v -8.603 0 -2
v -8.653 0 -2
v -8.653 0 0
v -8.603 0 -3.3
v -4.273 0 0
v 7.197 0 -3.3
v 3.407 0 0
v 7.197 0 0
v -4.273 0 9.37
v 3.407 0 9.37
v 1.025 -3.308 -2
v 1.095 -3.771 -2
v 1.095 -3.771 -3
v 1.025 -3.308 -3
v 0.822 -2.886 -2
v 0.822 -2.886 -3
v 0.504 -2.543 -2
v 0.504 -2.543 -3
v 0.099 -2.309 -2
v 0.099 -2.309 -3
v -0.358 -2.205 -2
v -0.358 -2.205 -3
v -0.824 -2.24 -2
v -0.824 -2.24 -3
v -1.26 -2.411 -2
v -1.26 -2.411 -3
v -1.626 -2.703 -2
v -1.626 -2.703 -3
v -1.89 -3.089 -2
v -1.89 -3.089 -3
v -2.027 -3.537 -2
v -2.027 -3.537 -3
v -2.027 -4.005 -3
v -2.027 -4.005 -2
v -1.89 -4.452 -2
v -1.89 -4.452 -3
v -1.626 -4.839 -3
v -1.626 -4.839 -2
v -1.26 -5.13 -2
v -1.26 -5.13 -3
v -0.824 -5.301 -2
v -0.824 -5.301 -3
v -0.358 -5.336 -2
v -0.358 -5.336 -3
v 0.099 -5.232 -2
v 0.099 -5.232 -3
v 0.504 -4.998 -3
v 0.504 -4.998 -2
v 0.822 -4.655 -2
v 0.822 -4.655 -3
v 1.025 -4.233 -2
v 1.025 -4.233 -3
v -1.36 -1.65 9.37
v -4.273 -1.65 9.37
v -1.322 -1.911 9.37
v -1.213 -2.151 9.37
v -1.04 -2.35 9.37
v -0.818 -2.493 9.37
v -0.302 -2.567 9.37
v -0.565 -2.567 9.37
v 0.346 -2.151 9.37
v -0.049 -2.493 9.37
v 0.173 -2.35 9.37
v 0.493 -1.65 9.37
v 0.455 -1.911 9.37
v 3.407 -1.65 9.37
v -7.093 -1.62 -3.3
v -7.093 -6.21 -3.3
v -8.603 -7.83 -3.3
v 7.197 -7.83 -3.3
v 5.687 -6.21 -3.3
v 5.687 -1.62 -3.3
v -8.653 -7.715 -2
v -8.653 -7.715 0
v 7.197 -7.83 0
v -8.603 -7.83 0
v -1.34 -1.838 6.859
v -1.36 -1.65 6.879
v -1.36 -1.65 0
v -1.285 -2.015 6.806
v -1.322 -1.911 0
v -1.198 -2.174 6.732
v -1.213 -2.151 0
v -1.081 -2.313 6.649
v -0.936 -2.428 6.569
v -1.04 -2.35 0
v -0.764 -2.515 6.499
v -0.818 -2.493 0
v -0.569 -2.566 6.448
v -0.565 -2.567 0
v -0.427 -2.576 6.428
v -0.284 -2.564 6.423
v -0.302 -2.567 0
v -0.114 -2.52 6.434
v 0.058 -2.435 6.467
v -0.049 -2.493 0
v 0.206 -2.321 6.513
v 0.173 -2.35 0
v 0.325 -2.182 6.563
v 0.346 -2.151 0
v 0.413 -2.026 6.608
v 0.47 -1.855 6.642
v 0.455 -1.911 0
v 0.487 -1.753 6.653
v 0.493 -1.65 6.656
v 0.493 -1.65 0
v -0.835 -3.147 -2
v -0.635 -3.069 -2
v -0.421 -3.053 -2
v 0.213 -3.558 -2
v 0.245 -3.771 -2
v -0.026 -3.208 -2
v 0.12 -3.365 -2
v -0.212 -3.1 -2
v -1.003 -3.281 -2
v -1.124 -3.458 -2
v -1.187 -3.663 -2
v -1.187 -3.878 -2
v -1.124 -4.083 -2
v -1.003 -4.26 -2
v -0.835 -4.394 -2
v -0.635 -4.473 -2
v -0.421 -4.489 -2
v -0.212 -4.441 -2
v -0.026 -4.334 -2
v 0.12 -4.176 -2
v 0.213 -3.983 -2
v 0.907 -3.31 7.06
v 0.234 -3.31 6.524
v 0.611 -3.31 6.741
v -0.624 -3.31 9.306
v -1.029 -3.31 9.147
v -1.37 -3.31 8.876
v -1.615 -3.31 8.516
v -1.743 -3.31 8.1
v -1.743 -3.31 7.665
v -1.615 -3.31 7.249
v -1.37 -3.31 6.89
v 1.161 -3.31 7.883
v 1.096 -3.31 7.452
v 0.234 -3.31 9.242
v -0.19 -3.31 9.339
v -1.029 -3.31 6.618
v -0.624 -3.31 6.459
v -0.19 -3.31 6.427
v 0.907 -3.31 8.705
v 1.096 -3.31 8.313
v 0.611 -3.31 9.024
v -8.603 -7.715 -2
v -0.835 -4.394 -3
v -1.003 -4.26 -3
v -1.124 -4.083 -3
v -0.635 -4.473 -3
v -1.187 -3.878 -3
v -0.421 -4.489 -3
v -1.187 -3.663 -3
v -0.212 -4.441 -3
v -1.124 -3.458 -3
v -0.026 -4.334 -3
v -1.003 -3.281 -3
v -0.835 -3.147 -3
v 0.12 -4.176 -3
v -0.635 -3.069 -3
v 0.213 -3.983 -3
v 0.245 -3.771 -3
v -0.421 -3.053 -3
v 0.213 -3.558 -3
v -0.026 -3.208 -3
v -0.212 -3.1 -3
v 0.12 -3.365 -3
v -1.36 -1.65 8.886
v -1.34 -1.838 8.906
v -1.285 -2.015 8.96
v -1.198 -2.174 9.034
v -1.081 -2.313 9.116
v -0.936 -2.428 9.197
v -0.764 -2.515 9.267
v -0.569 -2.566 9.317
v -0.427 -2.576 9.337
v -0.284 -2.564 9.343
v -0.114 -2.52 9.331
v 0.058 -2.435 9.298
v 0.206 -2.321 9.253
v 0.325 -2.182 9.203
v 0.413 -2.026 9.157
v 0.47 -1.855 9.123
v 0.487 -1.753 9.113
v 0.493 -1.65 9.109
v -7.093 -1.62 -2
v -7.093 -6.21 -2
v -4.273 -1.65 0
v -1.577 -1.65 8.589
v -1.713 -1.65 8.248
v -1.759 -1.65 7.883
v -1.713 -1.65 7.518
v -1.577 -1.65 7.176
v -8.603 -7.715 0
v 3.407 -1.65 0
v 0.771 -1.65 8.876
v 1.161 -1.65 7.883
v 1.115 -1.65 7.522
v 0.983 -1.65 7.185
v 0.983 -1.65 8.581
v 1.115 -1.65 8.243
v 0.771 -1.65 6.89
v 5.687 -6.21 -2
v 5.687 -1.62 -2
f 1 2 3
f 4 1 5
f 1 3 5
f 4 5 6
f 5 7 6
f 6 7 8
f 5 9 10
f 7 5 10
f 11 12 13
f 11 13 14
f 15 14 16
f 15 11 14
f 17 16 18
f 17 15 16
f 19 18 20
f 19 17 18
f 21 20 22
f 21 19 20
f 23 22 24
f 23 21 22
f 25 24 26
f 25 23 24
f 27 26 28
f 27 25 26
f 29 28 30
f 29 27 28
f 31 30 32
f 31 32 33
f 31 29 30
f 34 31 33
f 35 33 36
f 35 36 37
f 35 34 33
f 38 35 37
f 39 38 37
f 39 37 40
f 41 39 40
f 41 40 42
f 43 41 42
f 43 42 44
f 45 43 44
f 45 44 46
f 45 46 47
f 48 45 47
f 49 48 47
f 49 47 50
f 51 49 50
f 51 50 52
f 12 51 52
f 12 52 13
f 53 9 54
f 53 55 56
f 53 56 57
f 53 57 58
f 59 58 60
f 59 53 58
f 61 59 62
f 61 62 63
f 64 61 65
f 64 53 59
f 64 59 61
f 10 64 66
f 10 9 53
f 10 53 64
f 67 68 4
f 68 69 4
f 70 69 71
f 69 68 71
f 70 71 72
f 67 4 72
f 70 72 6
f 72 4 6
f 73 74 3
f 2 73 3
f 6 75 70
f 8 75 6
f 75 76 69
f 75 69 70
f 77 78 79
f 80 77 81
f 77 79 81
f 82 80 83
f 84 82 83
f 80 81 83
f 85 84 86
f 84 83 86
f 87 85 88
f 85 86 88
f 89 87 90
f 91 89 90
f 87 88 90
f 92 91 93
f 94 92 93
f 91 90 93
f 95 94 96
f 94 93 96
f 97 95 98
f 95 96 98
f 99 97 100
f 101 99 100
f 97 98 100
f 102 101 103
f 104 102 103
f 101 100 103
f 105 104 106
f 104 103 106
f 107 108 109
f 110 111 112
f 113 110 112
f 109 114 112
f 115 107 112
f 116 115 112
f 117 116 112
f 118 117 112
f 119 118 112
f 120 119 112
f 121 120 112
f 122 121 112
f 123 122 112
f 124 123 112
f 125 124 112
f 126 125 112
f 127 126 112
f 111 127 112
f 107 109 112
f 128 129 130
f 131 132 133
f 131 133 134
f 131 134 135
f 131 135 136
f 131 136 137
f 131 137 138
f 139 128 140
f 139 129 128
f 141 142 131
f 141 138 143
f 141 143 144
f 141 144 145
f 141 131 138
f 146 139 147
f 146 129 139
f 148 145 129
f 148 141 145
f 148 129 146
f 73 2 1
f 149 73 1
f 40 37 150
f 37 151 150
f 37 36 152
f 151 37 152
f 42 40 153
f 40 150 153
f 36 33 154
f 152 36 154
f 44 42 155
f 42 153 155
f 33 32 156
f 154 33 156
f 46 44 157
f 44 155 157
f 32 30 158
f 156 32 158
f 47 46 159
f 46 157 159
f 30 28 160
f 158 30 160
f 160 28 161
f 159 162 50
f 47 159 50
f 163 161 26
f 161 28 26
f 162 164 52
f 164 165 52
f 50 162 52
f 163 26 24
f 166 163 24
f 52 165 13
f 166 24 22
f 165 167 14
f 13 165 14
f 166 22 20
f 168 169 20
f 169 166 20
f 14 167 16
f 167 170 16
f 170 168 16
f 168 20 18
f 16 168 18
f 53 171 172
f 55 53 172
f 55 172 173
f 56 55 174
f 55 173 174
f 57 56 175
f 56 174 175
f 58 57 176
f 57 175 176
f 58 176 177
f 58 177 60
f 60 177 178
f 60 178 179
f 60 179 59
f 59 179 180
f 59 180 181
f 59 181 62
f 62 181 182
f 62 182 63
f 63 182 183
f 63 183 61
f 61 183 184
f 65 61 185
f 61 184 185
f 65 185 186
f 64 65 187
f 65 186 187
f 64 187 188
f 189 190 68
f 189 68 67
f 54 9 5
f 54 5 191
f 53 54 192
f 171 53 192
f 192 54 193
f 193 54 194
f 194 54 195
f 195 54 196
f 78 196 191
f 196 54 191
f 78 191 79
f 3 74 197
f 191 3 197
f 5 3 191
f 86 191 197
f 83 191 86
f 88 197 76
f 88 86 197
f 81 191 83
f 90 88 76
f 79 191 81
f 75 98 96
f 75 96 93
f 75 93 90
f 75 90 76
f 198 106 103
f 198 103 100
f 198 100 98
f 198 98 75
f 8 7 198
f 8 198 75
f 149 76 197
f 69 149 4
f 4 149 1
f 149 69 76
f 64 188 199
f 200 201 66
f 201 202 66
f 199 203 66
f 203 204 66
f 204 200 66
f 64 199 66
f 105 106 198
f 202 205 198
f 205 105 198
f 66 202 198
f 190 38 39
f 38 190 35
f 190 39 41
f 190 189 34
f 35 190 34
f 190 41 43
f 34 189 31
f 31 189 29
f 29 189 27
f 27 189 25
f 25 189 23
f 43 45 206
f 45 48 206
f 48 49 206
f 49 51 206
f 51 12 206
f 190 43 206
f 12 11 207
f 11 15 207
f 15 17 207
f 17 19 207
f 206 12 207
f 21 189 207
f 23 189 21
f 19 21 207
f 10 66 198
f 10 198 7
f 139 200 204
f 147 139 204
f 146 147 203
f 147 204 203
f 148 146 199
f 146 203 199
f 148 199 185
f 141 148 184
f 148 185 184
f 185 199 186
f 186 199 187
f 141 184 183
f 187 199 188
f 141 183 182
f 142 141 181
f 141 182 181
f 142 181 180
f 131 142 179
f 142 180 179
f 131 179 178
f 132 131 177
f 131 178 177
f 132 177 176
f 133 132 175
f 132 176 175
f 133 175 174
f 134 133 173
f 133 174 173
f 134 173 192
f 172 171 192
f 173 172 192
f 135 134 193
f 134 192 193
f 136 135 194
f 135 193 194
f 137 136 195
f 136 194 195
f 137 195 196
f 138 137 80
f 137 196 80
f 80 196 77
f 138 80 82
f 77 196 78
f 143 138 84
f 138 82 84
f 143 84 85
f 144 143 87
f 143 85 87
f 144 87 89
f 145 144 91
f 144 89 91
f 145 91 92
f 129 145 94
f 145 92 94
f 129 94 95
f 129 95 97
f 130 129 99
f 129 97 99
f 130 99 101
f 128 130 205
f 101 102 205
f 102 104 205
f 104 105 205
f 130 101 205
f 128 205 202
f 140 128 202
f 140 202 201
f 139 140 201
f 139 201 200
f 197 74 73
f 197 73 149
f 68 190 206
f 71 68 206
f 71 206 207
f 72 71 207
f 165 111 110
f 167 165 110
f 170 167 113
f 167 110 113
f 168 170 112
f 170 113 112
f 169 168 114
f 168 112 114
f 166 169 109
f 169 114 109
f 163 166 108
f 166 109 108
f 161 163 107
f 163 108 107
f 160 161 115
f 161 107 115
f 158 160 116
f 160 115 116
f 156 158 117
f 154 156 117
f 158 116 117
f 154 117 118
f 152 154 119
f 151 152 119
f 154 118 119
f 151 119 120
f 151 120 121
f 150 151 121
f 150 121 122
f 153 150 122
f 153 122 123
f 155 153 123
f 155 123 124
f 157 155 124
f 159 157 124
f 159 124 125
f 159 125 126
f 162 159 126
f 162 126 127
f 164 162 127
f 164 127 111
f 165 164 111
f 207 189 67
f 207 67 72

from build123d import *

# Parameters (mm, degrees)
F0_W      = 15.8
F0_H      = 7.83
F1_DEPTH  = 3.3
F3_DEPTH  = 9.37
F4_R      = 1.46
F5_DEPTH  = 3.31
F6_W      = 12.78
F6_H      = 4.59
F7_DEPTH  = 25
F8_W      = 15.7957389019
F8_H      = 7.7149206772
F9_DEPTH  = 2
F10_R     = 1.57
F10_R_2   = 0.72
F11_DEPTH = 3


with BuildPart() as f1:
    # F0 (on Top) → F1 (new body)
    with BuildSketch(Plane.XY):
        with Locations((-0.7034245188, -3.915)):
            Rectangle(F0_W, F0_H)
    extrude(amount=-F1_DEPTH)

    # F2 (on Top) → F3 (join)
    with BuildSketch(Plane.XY):
        with BuildLine():
            Line((3.4065754812, 0), (-4.2734245188, 0))
            Line((-4.2734245188, 0), (-4.2734245188, -1.65))
            Line((-4.2734245188, -1.65), (-1.3598001921, -1.65))
            ThreePointArc((-1.3598001921, -1.65), (-0.4334245188, -0.7236243267), (0.4929511545, -1.65))
            Line((0.4929511545, -1.65), (3.4065754812, -1.65))
            Line((3.4065754812, -1.65), (3.4065754812, 0))
        make_face()
        with BuildLine():
            ThreePointArc((0.4929511545, -1.65), (-0.4334245188, -0.7236243267), (-1.3598001921, -1.65))
            Line((-1.3598001921, -1.65), (0.4929511545, -1.65))
        make_face()
        with BuildLine():
            Line((0.4929511545, -1.65), (-1.3598001921, -1.65))
            ThreePointArc((-1.3598001921, -1.65), (-0.4334245188, -2.5763756733), (0.4929511545, -1.65))
        make_face()
    extrude(amount=F3_DEPTH)

    # F4 (on Front) → F5 (join)
    with BuildSketch(Plane.XZ):
        with Locations((-0.2993772502, 7.8826601838)):
            Circle(F4_R)
    extrude(amount=F5_DEPTH)

    # F6 (on Top) → F7 (cut)
    with BuildSketch(Plane.XY):
        with Locations((-0.7034245188, -3.915)):
            Rectangle(F6_W, F6_H)
    extrude(amount=-F7_DEPTH, mode=Mode.SUBTRACT)

    # F8 (on Top) → F9 (join)
    with BuildSketch(Plane.XY):
        with Locations((-0.7554732729, -3.8574603386)):
            Rectangle(F8_W, F8_H)
    extrude(amount=-F9_DEPTH)

    # F10 (on Top) → F11 (join)
    with BuildSketch(Plane.XY):
        with Locations((-0.4749980129, -3.7706719508)):
            Circle(F10_R)
        with Locations((-0.4749980129, -3.7706719508)):
            Circle(F10_R_2, mode=Mode.SUBTRACT)
    extrude(amount=-F11_DEPTH)


solid = f1.part
